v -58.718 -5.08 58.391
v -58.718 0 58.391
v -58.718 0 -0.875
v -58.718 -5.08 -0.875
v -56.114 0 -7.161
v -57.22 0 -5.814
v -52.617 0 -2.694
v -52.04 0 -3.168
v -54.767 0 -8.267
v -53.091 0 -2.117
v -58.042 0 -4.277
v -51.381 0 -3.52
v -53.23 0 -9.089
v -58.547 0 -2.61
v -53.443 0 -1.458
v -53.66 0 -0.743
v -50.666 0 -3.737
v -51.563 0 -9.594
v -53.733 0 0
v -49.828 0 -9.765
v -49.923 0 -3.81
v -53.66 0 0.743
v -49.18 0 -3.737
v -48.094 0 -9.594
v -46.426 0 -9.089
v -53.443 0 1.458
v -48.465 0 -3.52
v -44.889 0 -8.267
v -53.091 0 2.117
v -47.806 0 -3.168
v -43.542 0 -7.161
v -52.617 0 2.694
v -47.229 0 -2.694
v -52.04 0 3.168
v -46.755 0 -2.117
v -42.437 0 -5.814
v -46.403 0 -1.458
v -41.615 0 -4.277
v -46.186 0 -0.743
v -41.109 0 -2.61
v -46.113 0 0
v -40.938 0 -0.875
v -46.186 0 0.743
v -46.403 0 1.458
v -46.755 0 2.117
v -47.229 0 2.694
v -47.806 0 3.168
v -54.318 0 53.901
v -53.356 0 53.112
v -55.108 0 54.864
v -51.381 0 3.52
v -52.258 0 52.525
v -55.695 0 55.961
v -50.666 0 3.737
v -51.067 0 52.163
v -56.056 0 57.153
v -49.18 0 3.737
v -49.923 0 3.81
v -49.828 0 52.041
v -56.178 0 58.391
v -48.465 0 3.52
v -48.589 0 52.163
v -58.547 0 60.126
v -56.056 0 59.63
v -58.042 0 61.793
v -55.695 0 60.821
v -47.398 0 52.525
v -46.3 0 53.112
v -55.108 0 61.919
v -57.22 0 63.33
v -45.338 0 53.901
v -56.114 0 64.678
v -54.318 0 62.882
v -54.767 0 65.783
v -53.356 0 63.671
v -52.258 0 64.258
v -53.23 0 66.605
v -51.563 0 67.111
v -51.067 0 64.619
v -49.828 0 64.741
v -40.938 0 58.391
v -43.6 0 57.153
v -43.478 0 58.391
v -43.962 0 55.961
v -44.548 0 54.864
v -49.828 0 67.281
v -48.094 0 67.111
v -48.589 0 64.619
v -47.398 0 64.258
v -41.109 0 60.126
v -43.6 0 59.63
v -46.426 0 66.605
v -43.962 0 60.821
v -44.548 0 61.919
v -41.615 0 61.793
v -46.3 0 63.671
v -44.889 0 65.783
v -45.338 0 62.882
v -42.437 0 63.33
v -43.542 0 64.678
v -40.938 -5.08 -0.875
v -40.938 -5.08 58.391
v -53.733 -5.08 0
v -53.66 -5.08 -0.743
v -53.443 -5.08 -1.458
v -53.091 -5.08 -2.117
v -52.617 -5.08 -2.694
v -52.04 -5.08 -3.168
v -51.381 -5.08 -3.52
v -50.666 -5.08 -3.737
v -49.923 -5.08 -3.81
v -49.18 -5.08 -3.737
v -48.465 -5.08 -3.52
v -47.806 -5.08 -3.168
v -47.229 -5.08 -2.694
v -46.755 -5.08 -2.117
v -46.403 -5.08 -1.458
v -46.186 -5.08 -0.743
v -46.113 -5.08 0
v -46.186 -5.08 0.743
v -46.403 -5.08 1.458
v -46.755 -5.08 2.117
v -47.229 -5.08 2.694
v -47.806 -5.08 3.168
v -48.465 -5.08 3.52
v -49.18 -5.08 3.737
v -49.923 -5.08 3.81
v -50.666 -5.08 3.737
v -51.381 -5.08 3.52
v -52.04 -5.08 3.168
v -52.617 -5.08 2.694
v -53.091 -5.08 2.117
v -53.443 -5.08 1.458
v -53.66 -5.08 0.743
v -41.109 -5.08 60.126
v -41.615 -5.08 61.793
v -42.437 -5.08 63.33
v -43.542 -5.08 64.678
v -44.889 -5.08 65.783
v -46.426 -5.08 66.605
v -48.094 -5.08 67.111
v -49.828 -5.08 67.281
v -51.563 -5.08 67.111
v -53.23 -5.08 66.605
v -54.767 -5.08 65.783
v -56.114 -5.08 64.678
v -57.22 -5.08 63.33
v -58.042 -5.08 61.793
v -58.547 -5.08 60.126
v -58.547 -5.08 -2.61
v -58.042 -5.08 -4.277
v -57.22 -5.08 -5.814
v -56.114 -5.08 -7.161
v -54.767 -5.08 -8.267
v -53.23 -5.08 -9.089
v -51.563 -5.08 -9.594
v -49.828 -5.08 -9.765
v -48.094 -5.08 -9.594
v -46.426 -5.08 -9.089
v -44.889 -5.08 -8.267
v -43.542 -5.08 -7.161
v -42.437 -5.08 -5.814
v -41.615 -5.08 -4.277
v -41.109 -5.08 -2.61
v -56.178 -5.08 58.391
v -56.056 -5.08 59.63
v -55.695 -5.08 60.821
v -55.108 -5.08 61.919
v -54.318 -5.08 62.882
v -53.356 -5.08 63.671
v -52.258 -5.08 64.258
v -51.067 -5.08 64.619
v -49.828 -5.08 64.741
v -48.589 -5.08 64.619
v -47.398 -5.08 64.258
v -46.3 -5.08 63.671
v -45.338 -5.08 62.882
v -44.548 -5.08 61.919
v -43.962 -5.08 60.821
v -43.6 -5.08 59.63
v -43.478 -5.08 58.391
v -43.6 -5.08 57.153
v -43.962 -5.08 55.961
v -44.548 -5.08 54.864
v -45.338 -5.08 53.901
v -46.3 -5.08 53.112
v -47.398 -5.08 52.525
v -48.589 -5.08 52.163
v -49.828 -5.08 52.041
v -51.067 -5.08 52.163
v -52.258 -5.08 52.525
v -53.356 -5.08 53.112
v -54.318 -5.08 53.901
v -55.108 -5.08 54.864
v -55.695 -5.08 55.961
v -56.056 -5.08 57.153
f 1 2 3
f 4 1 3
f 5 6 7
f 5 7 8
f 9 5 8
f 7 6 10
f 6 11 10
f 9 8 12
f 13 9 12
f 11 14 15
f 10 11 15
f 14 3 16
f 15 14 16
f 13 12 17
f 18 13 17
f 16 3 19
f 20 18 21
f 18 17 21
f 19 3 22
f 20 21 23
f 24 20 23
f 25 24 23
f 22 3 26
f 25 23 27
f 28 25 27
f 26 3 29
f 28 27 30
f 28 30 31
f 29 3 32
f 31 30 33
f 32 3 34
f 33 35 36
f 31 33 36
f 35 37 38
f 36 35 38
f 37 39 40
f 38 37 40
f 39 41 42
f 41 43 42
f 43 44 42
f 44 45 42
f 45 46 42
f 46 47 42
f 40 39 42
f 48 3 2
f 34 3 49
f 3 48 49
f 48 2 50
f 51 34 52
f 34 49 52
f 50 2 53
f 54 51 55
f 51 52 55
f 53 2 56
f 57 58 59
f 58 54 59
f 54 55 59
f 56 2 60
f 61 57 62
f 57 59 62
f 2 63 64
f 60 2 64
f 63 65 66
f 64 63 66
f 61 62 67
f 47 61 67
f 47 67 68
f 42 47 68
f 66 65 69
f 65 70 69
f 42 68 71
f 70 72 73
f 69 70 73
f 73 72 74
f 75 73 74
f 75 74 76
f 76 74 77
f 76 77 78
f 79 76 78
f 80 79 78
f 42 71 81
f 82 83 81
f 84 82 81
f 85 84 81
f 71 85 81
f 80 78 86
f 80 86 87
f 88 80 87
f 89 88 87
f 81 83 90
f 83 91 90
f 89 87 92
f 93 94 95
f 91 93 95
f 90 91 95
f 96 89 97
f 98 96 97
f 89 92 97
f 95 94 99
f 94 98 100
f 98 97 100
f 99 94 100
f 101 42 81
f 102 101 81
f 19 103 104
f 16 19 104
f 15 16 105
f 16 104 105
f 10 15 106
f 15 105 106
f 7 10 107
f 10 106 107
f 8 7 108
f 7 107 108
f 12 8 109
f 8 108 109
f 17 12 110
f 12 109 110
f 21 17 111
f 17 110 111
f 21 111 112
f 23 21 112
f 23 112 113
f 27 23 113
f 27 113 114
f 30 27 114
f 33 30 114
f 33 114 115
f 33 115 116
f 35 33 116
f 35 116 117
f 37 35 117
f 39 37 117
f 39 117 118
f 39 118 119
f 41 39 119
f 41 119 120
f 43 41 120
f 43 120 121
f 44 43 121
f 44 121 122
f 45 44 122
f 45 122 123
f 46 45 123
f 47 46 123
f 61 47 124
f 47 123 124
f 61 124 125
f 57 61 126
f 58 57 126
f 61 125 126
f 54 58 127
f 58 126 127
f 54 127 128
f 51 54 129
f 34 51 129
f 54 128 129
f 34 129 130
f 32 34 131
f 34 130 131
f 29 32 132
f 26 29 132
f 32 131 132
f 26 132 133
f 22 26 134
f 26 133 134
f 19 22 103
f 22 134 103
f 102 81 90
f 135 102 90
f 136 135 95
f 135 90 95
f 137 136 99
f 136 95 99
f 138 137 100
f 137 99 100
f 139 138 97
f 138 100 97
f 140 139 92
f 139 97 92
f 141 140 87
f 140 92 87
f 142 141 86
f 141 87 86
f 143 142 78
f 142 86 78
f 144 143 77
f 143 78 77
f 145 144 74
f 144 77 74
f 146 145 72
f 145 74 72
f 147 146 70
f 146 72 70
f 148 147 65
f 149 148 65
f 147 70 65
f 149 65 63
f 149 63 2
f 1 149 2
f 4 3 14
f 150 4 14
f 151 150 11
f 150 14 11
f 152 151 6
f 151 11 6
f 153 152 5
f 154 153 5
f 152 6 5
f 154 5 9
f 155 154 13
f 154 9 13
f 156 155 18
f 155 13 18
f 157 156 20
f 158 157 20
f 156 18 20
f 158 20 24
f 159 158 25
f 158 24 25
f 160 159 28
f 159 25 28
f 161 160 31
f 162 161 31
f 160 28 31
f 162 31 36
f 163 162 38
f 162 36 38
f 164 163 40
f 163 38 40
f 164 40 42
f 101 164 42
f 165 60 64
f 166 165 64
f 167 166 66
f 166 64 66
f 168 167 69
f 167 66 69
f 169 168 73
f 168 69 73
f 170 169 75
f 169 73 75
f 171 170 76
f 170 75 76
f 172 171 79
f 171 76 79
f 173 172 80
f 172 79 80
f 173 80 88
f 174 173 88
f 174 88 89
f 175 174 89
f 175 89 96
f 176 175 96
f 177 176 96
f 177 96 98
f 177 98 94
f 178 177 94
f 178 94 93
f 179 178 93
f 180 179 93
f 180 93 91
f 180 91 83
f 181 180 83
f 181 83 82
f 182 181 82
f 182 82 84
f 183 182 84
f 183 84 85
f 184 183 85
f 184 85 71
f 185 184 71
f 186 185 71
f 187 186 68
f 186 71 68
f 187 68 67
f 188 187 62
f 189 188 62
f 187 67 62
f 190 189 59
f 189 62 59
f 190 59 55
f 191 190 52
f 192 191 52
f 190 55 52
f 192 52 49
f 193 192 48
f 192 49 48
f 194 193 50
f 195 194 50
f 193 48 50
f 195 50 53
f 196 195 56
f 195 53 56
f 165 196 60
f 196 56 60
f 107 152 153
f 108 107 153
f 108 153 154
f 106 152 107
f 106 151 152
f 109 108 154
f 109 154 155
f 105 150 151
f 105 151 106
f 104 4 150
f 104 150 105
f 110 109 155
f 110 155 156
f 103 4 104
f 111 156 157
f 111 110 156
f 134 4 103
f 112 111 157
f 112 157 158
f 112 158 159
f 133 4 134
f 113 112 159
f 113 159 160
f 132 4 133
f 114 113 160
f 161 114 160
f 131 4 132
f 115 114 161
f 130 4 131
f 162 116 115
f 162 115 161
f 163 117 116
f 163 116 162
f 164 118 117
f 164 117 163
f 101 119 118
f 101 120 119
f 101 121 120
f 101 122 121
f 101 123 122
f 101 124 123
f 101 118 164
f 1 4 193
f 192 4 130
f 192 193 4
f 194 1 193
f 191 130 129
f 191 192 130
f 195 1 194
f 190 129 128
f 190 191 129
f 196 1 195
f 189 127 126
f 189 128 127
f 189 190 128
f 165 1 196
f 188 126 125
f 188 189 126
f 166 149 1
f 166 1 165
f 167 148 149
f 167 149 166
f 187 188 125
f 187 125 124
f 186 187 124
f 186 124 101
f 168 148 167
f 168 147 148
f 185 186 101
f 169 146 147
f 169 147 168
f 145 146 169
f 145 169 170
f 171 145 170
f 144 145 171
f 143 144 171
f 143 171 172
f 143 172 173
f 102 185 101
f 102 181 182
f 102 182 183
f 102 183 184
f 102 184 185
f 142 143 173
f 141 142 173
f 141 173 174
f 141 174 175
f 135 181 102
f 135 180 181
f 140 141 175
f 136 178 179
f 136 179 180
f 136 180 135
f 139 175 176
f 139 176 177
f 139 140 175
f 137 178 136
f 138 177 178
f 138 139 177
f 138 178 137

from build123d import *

# Parameters (mm, degrees)
F1_DEPTH = 5.08
F3_D     = 7.62
F5_D     = 12.7


with BuildPart() as f1:
    # F0 (on Front) → F1 (new body)
    with BuildSketch(Plane.XZ):
        with BuildLine():
            ThreePointArc((-40.938293, 58.391372), (-49.828293, 67.281372), (-58.718293, 58.391372))
            Line((-58.718293, 58.391372), (-58.718293, -0.875289))
            ThreePointArc((-58.718293, -0.875289), (-49.828293, -9.765289), (-40.938293, -0.875289))
            Line((-40.938293, -0.875289), (-40.938293, 58.391372))
        make_face()
    extrude(amount=F1_DEPTH)

    # F3 (through all)
    with Locations(Plane(origin=(0, 0, 0), x_dir=(1, 0, 0), z_dir=(0, 1, 0))):
        with Locations((-49.923204, 0)):
            Hole(F3_D / 2)

    # F5 (through all)
    with Locations(Plane.XZ.offset(5.08)):
        with Locations((-49.828293, 58.391372)):
            Hole(F5_D / 2)


solid = f1.part
